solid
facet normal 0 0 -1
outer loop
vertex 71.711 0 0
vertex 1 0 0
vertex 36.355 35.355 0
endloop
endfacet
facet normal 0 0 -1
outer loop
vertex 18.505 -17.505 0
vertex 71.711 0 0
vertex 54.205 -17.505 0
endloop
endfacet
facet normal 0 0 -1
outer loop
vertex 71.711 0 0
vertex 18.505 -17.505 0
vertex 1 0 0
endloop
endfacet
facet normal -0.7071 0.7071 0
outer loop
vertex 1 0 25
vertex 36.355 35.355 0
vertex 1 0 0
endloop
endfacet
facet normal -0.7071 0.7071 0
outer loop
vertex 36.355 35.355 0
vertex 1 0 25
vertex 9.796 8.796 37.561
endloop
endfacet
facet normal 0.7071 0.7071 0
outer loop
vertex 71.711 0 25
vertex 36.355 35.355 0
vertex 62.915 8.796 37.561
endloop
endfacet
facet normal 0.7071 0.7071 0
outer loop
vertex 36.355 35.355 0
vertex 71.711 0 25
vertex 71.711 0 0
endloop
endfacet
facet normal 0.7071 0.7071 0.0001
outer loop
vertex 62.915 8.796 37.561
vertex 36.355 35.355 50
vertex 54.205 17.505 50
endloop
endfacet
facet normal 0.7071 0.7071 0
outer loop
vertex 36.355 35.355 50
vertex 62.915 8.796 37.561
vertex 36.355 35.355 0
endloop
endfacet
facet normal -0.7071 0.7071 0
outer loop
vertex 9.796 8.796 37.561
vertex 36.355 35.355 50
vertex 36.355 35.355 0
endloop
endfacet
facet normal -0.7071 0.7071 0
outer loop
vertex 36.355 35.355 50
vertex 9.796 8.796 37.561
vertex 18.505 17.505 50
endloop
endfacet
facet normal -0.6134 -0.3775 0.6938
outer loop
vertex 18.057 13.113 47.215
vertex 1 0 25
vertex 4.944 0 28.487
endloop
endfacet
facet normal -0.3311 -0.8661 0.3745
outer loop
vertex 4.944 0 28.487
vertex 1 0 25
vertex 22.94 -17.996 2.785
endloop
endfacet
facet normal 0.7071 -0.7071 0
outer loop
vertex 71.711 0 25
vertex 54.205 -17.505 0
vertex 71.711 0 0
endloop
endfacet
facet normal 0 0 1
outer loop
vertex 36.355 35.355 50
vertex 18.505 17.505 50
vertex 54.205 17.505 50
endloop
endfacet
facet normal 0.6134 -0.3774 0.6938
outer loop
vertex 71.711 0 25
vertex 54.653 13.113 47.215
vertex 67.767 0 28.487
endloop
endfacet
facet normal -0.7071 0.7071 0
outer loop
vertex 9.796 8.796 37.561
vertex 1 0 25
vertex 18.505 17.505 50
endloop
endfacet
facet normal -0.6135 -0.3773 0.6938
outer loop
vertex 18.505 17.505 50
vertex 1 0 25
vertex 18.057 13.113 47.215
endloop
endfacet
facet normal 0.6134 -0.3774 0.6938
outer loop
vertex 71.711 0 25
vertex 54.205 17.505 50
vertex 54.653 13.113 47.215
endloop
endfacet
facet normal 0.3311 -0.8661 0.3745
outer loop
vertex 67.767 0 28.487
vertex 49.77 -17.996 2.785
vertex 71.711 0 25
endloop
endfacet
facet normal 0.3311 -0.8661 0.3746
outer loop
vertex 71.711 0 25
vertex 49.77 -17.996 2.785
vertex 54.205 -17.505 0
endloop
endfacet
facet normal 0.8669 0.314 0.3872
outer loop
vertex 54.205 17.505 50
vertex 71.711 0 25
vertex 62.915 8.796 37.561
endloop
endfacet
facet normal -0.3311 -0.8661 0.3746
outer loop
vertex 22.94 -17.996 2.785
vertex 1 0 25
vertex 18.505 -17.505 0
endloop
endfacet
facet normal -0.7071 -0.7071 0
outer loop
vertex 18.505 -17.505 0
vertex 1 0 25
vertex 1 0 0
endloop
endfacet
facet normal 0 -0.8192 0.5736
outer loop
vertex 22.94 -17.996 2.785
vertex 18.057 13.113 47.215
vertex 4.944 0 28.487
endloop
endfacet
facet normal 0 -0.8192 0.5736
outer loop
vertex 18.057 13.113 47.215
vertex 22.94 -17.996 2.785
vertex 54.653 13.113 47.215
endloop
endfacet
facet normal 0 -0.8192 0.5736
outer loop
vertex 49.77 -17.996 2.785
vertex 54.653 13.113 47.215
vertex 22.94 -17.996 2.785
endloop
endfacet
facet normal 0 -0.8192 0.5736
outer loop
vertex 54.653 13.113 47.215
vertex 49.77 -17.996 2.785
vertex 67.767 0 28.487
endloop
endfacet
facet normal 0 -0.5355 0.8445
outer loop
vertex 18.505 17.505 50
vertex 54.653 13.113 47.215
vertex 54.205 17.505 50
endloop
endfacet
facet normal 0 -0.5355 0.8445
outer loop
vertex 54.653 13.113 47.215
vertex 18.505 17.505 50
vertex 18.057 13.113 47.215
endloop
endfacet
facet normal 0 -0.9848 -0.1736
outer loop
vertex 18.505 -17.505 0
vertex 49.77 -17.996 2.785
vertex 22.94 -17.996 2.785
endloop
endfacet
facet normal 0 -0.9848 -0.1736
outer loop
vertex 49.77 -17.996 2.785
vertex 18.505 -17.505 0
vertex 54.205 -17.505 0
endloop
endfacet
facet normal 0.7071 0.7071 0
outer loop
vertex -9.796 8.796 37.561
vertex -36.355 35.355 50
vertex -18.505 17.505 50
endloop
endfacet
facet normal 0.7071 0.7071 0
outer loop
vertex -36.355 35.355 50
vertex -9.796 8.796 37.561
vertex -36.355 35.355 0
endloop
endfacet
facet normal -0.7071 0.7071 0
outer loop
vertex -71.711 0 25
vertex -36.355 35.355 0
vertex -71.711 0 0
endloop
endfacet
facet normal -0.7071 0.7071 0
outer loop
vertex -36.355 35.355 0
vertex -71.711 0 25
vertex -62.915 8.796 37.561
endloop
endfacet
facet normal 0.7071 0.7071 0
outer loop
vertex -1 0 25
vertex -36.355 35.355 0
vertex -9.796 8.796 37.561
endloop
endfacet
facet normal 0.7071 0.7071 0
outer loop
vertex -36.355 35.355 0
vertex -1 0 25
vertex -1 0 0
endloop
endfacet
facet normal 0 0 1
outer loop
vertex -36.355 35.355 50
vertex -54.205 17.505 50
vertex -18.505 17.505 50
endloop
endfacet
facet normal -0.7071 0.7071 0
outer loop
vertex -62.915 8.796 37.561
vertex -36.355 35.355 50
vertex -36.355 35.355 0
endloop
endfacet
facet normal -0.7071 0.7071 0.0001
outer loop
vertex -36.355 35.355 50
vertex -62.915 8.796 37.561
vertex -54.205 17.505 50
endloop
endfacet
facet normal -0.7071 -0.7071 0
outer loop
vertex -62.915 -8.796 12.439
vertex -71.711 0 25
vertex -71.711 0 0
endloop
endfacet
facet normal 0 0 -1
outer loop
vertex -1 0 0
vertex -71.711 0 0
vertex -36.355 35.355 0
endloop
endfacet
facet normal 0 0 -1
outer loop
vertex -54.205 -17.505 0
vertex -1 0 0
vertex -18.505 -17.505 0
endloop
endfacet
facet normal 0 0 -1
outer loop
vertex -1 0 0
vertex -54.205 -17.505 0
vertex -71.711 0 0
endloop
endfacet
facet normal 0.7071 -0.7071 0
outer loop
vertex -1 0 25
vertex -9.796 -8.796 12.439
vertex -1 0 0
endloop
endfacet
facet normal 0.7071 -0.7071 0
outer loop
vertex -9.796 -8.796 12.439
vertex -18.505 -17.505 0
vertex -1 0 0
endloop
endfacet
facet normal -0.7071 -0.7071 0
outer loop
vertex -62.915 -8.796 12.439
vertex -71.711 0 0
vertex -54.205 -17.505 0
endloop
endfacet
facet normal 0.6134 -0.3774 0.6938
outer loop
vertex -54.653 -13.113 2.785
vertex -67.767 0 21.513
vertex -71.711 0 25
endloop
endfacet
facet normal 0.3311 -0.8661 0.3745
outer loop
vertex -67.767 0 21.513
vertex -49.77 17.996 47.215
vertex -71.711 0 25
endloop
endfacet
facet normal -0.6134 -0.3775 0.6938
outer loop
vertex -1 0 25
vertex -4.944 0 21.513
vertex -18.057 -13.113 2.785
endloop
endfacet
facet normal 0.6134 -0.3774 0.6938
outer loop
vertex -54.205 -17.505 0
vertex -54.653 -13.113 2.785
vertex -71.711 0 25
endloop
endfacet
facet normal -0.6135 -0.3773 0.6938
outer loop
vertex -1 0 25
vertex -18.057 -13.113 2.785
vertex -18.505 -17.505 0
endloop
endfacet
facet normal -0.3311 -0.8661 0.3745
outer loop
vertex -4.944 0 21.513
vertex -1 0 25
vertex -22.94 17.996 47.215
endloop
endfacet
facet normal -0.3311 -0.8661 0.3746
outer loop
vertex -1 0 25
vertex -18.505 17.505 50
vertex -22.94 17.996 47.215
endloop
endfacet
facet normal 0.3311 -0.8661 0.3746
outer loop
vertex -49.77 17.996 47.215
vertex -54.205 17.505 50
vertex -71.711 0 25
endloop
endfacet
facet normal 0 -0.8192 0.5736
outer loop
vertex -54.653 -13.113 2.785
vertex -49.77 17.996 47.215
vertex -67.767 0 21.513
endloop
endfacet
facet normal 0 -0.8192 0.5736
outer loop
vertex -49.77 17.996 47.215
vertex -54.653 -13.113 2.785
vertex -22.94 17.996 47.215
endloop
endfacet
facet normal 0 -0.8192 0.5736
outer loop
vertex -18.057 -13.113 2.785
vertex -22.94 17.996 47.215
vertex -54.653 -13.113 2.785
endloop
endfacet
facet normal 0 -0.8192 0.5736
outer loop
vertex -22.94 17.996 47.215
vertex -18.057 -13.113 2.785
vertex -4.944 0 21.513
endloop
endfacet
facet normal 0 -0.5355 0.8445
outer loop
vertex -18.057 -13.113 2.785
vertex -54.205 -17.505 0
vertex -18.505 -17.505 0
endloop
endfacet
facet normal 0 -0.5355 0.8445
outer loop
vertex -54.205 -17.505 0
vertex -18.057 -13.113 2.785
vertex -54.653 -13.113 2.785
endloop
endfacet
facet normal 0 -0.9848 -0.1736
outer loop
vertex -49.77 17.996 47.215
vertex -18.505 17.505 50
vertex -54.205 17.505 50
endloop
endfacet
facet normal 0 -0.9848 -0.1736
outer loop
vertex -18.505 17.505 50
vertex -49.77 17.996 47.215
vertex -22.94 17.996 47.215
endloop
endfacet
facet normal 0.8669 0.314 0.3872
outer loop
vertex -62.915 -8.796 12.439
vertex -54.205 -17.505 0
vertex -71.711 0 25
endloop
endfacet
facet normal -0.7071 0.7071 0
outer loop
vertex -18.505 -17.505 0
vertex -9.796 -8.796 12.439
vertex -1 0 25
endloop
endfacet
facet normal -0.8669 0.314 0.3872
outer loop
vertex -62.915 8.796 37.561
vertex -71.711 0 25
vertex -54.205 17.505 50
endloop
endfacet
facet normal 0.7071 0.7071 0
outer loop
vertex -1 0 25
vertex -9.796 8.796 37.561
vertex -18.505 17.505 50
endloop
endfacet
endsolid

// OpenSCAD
// file cross_section.scad
// cuts an n-sided prism with a plane at height h and at angle sliceangle([x,y,z])
// (c) 2020 Rich Cameron, CC-BY International license

h = 50; // height of the prism, in mm
n = 4; // number of sides (not counting top and bottom)
// use n = 100 for cylinder
r = h / (2 * cos(180 / n));  //radius of the prism, mm 

rim = 2;

//change next two lines to get different cross-sections 
sliceangle = ([55, 0, 0]); //rotation in degrees about x, y, z axes
sliceheight = h / 2; //height above z = 0 where plane of rotation intersects prism

translate([r + 1, 0, h - sliceheight]) rotate([180, 0, 0]) rotate(sliceangle) intersection() {
	shape();
	%shape();
	hull() {
		translate([0, 0, -rim]) linear_extrude() intersection() {
			offset(-rim) projection(cut = true) shape();
			offset(-rim) projection(cut = true) translate([0, 0, rim * 2]) shape();
		}
		intersection() {
			linear_extrude(1000) square(1000, center = true);
			shape();
		}
	}
}

translate([-r - 1, 0, sliceheight]) rotate(sliceangle) difference() {
	shape();
	%shape();
	hull() {
		translate([0, 0, -rim]) linear_extrude() intersection() {
			offset(-rim) projection(cut = true) shape();
			offset(-rim) projection(cut = true) translate([0, 0, rim * 2]) shape();
		}
		intersection() {
			linear_extrude(1000) square(1000, center = true);
			shape();
		}
	}
	linear_extrude(1000) square(1000, center = true);
}

module shape() rotate([-sliceangle[0], 0, 0]) rotate([0, -sliceangle[1], 0]) rotate([0, 0, -sliceangle[2]]) translate([0, 0, -sliceheight]) cylinder(r = r, h = h, $fn = n);
